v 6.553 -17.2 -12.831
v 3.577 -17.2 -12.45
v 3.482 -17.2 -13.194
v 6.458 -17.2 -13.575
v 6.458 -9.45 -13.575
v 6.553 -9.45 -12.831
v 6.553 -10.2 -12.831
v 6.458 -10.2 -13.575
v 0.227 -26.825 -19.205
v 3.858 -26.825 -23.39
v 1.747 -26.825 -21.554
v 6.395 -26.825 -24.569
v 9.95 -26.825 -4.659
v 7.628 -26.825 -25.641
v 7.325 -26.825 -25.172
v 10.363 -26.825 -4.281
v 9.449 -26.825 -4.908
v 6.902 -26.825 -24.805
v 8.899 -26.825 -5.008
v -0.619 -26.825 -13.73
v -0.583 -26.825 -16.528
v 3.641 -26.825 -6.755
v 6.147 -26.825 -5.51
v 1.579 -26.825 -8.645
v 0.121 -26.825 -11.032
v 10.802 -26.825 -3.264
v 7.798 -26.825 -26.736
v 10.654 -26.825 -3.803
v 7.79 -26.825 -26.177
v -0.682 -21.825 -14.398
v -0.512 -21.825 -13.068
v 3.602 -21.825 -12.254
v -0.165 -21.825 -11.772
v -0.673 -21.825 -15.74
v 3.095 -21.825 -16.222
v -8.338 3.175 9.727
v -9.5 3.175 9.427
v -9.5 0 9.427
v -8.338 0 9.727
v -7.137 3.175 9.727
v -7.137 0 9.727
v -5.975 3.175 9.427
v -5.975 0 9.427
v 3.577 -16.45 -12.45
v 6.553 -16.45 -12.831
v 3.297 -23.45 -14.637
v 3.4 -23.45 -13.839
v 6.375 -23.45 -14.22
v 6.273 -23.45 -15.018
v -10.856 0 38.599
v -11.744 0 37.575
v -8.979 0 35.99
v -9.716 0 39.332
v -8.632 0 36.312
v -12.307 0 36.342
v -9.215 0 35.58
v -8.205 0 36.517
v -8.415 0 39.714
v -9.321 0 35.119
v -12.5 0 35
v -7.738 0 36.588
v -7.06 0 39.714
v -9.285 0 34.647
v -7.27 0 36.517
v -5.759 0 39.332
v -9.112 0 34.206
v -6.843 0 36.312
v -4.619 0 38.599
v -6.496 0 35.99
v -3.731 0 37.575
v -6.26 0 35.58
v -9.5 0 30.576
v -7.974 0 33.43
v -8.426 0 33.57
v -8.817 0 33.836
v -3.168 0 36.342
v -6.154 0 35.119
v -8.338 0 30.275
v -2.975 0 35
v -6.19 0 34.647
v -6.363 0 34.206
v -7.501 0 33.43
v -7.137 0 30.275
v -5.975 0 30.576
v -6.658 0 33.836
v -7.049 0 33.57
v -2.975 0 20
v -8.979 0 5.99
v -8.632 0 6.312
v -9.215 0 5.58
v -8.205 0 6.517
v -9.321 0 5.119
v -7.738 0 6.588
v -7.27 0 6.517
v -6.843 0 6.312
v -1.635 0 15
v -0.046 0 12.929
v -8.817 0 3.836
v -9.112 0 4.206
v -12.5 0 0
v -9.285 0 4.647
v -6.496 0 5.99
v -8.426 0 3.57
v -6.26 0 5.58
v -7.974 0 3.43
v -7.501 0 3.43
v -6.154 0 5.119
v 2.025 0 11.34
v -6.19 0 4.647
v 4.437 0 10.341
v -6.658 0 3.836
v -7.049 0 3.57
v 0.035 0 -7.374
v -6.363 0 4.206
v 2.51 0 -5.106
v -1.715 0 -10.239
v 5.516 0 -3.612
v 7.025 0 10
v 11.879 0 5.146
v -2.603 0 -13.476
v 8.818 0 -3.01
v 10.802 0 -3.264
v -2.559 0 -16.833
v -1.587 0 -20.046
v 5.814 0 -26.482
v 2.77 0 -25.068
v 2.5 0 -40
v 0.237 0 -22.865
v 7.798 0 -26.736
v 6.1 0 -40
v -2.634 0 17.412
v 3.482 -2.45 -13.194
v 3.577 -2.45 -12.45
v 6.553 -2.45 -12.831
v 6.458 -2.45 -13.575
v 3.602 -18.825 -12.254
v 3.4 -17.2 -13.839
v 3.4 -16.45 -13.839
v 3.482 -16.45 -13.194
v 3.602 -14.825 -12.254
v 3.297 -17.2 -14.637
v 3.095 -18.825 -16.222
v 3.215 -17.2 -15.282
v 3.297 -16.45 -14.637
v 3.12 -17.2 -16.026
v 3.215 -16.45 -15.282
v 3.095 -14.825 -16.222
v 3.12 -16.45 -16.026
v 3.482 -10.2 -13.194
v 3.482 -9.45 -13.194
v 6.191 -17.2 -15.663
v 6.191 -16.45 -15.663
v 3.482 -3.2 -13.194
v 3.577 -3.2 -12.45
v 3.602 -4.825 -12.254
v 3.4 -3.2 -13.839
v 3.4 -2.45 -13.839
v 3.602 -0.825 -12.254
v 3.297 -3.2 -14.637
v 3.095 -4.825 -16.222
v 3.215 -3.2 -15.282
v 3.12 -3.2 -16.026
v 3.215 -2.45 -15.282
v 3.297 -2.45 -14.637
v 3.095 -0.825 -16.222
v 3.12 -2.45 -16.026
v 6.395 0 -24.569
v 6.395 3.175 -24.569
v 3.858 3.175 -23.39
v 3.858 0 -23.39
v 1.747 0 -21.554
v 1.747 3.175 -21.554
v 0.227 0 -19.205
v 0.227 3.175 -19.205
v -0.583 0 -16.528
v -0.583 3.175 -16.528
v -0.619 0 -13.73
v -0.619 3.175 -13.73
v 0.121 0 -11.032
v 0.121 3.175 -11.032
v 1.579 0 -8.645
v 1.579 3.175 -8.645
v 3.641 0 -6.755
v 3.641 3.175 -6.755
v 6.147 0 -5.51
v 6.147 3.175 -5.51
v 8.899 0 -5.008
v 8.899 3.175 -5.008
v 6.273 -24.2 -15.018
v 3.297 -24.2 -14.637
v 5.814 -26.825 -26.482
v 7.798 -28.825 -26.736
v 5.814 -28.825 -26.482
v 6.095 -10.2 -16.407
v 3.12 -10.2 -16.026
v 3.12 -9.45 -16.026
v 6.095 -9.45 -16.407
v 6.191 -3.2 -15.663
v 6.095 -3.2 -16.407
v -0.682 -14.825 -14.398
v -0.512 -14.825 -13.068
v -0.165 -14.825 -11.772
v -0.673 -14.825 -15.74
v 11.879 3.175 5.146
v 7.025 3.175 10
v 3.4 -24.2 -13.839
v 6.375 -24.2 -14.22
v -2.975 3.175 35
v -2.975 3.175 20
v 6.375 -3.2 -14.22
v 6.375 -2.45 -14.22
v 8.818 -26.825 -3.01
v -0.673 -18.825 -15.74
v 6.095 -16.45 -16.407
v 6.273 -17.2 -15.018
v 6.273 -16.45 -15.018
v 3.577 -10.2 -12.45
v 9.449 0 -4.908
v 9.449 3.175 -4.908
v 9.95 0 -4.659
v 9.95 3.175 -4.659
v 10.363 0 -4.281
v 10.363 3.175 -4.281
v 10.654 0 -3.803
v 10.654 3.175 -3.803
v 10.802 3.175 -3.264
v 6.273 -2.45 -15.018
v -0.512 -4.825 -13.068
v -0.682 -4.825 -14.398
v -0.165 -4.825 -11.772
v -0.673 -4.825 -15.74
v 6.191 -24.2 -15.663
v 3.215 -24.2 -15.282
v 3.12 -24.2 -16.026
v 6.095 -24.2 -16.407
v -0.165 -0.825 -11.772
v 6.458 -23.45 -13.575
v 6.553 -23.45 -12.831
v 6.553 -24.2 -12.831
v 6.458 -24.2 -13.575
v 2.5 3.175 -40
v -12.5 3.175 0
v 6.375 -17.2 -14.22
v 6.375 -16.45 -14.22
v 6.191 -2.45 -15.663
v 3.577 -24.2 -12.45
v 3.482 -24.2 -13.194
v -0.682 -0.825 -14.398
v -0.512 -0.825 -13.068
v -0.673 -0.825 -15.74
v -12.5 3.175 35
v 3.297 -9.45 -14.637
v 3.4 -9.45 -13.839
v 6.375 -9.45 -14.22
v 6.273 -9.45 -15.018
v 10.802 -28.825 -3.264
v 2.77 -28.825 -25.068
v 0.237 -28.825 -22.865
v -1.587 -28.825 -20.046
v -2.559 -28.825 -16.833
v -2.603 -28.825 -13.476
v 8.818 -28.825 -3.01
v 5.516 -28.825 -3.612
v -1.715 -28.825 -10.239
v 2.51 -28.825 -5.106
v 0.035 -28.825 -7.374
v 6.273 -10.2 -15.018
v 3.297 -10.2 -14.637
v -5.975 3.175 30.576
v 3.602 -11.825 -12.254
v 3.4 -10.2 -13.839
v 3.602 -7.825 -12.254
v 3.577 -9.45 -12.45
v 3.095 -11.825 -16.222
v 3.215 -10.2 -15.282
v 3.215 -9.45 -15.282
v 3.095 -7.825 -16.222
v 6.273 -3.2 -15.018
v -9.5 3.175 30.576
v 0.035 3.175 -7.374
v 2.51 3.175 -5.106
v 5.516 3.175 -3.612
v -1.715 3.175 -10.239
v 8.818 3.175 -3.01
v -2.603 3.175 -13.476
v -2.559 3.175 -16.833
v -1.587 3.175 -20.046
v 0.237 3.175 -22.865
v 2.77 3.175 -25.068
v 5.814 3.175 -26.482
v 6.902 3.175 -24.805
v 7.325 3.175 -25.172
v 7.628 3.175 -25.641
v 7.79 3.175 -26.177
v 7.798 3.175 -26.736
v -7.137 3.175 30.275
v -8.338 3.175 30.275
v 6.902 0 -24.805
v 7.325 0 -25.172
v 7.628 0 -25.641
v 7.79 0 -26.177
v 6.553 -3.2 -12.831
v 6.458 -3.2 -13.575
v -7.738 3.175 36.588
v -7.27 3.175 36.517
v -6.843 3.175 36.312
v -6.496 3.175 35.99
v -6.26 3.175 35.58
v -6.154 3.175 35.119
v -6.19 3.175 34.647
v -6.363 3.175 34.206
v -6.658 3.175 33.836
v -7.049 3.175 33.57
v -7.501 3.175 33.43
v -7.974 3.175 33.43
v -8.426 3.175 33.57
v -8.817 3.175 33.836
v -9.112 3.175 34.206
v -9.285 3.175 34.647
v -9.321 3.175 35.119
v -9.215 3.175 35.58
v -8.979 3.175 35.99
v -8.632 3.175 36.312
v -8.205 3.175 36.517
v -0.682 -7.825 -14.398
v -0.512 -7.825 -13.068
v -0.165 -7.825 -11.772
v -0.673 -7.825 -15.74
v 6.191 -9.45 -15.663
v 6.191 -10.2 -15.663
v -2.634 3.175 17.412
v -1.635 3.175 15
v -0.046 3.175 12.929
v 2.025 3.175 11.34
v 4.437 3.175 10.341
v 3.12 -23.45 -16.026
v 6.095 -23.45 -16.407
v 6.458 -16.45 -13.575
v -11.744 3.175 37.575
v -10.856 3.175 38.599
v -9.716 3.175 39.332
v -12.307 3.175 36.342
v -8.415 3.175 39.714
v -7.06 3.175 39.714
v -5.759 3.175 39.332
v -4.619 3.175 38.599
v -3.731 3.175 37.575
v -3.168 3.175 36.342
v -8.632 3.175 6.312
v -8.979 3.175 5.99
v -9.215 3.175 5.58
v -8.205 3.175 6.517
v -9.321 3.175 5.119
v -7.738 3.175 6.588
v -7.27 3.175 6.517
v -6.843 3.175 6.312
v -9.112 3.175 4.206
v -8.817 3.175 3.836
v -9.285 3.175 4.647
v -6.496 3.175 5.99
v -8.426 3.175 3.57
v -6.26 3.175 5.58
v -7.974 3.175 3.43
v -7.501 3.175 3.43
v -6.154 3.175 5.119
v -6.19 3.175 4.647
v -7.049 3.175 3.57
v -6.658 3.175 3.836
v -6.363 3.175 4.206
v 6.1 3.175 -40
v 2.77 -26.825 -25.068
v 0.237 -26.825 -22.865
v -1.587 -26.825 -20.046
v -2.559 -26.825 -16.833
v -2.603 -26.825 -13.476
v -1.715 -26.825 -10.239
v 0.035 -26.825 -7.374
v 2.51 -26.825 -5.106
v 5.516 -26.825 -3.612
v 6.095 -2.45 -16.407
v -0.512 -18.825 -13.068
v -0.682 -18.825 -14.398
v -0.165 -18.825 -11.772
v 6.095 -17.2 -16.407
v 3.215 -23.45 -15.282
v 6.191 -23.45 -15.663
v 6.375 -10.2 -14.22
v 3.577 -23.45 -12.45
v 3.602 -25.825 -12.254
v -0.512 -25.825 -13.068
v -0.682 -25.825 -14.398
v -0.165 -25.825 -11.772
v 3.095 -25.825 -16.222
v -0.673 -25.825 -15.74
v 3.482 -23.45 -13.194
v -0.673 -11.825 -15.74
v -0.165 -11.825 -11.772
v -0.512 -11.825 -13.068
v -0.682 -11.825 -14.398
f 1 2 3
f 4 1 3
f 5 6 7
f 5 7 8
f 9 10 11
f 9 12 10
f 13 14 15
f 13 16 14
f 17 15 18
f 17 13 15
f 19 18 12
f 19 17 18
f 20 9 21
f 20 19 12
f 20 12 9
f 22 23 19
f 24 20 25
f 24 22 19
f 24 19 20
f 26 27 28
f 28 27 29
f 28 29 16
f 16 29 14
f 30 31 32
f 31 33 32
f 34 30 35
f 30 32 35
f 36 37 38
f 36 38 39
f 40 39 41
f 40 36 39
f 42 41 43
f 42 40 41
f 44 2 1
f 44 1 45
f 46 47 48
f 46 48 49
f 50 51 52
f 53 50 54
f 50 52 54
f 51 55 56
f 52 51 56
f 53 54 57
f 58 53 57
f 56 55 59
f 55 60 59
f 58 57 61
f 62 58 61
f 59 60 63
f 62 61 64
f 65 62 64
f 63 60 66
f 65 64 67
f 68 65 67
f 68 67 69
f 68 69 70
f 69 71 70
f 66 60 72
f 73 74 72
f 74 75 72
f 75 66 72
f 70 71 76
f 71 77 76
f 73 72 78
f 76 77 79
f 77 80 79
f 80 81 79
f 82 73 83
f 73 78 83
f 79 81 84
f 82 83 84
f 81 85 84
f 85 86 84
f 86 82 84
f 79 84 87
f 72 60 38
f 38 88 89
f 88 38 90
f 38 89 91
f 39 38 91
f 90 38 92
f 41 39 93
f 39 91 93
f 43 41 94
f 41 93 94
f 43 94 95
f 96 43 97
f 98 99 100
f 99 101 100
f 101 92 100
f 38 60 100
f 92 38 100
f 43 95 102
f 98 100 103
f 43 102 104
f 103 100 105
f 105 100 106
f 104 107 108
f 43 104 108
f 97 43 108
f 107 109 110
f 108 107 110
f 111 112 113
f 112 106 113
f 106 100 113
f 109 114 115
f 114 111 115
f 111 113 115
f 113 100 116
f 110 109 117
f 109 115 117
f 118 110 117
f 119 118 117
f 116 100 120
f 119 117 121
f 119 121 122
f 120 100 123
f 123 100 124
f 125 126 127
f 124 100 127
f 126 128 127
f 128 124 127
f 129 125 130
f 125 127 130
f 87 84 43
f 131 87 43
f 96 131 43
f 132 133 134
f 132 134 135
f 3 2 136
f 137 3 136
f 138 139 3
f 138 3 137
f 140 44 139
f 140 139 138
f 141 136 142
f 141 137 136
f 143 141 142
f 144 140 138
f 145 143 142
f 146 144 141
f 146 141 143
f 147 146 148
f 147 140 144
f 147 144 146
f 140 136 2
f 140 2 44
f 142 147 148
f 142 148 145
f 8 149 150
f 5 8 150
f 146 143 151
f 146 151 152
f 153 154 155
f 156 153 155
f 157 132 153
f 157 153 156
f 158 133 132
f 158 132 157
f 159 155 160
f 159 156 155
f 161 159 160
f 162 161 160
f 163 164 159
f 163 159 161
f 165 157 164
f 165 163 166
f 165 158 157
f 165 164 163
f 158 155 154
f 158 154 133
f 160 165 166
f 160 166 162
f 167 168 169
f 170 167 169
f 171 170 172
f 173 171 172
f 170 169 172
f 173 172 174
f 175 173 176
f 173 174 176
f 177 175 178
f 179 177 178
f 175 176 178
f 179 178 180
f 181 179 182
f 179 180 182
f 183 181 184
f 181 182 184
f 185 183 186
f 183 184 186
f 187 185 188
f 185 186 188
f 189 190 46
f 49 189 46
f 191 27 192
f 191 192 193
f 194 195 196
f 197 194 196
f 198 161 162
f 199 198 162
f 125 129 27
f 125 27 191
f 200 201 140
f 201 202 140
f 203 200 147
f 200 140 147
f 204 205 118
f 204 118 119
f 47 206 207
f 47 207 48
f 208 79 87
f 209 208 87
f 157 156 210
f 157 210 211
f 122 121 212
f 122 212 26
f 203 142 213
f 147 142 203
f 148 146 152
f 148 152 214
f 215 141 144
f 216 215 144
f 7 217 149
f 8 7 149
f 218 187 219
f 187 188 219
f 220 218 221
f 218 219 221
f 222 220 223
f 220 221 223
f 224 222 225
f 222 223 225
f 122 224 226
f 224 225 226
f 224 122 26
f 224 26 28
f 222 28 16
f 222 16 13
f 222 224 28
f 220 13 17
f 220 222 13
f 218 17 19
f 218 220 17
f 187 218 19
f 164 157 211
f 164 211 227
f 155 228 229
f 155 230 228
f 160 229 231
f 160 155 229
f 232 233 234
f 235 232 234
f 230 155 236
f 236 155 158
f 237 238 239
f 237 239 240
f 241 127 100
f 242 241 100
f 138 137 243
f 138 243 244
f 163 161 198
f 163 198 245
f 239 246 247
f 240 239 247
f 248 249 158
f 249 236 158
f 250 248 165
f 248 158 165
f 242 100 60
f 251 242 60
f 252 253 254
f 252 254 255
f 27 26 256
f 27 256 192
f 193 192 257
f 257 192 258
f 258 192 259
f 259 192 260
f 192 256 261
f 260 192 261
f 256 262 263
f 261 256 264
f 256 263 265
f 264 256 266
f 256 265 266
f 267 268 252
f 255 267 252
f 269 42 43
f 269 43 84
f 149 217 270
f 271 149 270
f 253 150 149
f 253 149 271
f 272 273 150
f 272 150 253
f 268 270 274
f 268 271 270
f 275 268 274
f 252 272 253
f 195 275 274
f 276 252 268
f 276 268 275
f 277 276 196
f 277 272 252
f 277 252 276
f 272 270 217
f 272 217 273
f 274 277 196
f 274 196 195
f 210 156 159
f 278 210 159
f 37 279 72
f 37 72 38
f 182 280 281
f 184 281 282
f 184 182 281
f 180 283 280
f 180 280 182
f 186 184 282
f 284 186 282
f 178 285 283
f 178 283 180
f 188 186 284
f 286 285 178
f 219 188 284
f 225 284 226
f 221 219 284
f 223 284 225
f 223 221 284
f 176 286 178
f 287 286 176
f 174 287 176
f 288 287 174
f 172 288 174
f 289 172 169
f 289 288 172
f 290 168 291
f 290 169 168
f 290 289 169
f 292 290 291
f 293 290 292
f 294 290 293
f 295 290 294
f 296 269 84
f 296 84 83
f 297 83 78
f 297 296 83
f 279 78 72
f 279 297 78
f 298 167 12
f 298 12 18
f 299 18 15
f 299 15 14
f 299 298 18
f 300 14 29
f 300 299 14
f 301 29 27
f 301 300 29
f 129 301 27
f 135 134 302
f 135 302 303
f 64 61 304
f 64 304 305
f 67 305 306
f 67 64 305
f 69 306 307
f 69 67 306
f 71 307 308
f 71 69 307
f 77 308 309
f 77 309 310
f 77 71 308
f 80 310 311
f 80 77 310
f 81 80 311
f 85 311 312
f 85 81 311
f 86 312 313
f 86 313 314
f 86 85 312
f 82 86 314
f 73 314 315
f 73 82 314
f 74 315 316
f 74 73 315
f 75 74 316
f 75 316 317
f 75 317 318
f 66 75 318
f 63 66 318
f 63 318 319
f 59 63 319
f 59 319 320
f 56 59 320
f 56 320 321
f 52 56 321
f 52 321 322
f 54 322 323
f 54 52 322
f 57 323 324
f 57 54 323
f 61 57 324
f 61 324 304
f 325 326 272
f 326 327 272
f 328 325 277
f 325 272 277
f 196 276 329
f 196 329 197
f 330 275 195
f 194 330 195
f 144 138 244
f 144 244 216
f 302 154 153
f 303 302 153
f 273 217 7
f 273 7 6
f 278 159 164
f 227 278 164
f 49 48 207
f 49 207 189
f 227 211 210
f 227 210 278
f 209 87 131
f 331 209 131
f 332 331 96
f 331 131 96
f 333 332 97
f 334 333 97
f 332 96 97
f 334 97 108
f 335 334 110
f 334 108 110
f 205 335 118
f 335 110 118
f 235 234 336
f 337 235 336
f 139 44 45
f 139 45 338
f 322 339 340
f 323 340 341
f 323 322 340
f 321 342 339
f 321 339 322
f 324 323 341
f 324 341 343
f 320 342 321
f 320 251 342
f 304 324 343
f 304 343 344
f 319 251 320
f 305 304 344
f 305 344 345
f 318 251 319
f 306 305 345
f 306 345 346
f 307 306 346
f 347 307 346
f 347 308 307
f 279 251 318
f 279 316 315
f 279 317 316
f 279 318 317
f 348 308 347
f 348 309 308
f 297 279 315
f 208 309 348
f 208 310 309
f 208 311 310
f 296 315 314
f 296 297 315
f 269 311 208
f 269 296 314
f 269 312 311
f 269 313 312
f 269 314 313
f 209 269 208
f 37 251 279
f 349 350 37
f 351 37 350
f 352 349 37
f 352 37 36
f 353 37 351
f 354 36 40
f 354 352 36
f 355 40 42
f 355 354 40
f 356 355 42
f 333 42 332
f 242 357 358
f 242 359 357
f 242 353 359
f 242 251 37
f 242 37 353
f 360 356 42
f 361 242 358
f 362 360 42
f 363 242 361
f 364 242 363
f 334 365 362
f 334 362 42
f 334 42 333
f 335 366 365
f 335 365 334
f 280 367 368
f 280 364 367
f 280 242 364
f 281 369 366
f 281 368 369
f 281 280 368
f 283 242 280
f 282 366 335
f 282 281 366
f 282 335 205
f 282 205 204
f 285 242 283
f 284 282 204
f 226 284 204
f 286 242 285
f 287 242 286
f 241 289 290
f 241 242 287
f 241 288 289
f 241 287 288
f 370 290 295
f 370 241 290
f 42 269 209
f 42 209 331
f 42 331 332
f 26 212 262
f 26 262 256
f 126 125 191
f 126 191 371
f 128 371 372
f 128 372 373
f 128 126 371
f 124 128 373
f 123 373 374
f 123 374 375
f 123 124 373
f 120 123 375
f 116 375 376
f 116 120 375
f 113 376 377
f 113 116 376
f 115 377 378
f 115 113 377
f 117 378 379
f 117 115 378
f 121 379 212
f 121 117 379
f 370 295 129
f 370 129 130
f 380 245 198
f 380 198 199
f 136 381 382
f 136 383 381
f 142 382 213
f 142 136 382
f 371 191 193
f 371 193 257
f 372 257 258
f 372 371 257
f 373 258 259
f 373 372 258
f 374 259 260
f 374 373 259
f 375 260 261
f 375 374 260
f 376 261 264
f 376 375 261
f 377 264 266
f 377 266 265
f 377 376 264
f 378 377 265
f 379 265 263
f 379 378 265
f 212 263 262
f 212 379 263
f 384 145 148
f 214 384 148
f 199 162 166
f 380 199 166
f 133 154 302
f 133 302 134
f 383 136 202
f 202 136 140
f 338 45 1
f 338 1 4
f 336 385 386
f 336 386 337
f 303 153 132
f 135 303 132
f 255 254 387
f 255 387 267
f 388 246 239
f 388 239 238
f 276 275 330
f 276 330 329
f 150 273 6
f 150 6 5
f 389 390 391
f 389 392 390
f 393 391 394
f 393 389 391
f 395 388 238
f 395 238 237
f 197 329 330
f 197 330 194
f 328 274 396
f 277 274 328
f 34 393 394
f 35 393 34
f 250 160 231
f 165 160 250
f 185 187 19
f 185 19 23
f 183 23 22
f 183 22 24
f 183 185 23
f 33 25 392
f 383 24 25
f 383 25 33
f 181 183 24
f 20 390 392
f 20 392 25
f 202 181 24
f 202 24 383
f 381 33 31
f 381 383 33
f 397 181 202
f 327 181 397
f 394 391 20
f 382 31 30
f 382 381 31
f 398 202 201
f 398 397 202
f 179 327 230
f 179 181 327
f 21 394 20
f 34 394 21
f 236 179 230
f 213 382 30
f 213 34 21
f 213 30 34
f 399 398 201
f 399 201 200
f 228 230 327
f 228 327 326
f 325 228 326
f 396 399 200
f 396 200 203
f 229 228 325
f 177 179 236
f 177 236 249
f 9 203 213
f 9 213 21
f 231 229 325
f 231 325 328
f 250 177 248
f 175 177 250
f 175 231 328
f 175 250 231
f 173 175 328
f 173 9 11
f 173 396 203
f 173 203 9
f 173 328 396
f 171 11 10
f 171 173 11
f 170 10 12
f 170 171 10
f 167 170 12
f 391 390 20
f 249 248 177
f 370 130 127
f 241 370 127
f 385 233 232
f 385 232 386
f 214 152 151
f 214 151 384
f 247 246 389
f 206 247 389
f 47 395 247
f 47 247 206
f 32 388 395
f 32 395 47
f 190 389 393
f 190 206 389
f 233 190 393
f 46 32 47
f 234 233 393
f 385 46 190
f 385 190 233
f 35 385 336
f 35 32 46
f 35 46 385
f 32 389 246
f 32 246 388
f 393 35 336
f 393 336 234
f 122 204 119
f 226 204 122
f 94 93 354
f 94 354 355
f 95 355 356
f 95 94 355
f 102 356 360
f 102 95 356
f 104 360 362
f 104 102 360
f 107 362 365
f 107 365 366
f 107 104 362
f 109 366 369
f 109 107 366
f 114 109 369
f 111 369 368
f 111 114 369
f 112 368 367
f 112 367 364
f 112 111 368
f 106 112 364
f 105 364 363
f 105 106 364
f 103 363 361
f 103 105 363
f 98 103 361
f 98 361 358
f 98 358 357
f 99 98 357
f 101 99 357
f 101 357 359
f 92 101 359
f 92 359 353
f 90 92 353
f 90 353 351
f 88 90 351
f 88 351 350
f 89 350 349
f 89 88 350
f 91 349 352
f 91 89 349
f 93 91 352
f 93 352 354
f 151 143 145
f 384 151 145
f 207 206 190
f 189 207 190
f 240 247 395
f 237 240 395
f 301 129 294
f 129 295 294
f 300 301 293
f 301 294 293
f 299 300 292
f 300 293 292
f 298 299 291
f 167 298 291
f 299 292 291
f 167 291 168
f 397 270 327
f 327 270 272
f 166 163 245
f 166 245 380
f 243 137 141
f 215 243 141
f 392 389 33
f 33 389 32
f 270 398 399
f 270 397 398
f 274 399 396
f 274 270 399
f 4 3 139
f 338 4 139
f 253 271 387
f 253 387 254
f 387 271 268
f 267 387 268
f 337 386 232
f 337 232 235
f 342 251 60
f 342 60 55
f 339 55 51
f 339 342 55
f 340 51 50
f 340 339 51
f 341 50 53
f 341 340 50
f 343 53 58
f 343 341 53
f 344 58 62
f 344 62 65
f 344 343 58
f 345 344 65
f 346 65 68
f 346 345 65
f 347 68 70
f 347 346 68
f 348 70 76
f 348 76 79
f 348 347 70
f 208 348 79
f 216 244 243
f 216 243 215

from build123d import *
from build123d.topology import SkipClean

# Parameters (mm, degrees)
CROQUIS1_R               = 1.5875
SALIENTE_EXTRUIR1_DEPTH  = 3.175
CORTAR_EXTRUIR1_DEPTH    = 3.175
CORTAR_EXTRUIR3_DEPTH    = 10
CROQUIS5_R               = 10
CORTAR_EXTRUIR8_DEPTH    = 10
REDONDEO2_R              = 2
BOSS_EXTRUDE1_DEPTH      = 30
BOSS_EXTRUDE2_DEPTH      = 2
BOSS_EXTRUDE6_REACH      = 54.664
BOSS_EXTRUDE6_END_RADIUS = 10
SKETCH7_W                = 4
SKETCH7_H                = 4
SKETCH9_W                = 0.75
SKETCH9_H                = 0.75
SKETCH9_W_2              = 0.804911676
BOSS_EXTRUDE7_DEPTH      = 3
LPATTERN1_COUNT          = 4
LPATTERN1_PITCH          = 7


with BuildPart() as part:
    # Croquis1 → Saliente-Extruir1 (new body)
    with BuildSketch(Plane(origin=(0, 0, 0), x_dir=(1, 0, 0), z_dir=(0, 1, 0))):
        with BuildLine():
            Line((-12.5, 0), (-12.5, -40))
            Line((-12.5, -40), (-2.975, -40))
            Line((-2.975, -40), (-2.975, -20))
            ThreePointArc((-2.975, -20), (-0.046067812, -12.928932188), (7.025, -10))
            Line((7.025, -10), (12.5, -10))
            Line((12.5, -10), (12.5, 40))
            Line((12.5, 40), (2.5, 40))
            Line((2.5, 40), (-12.5, 0))
        make_face()
        with Locations(Location((-7.7375, -5, 0), (0, 0, 270))):
            Circle(CROQUIS1_R, mode=Mode.SUBTRACT)
        with Locations(Location((-7.7375, -35, 0), (0, 0, 270))):
            Circle(CROQUIS1_R, mode=Mode.SUBTRACT)
    extrude(amount=SALIENTE_EXTRUIR1_DEPTH)

    # Croquis2 → Cortar-Extruir1 (cut)
    with BuildSketch(Plane(origin=(0, 3.175, 0), x_dir=(1, 0, 0), z_dir=(0, 1, 0))):
        Polygon((12.5, -10), (6.1, 40), (12.5, 40), align=None)
    extrude(amount=-CORTAR_EXTRUIR1_DEPTH, mode=Mode.SUBTRACT)

    # Croquis3 → Cortar-Extruir3 (cut)
    with BuildSketch(Plane(origin=(0, 3.175, 0), x_dir=(1, 0, 0), z_dir=(0, 1, 0))):
        with BuildLine():
            ThreePointArc((-5.975, -30.575635639), (-7.7375, -30.2375), (-9.5, -30.575635639))
            Line((-9.5, -30.575635639), (-9.5, -9.427055314))
            ThreePointArc((-9.5, -9.427055314), (-7.7375, -9.765), (-5.975, -9.427055314))
            Line((-5.975, -9.427055314), (-5.975, -14.803847577))
            Line((-5.975, -14.803847577), (-5.975, -30.575635639))
        make_face()
        with BuildLine():
            ThreePointArc((-12.5, -35), (-7.7375, -39.7625), (-2.975, -35))
            Line((-2.975, -35), (-2.975, -40))
            Line((-2.975, -40), (-12.5, -40))
            Line((-12.5, -40), (-12.5, -35))
        make_face()
    extrude(amount=-CORTAR_EXTRUIR3_DEPTH, mode=Mode.SUBTRACT)

    # Croquis5 → Cortar-Extruir8 (cut)
    with BuildSketch(Plane(origin=(0, 3.175, 0), x_dir=(1, 0, 0), z_dir=(0, 1, 0))):
        with Locations((9.3, 15)):
            Circle(CROQUIS5_R)
        Polygon((7.025, -10), (11.878723404, -5.146276596), (12.5, -10), align=None)
    extrude(amount=-CORTAR_EXTRUIR8_DEPTH, mode=Mode.SUBTRACT)

    # Redondeo2
    redondeo2_edges = [part.edges().sort_by_distance(p)[0] for p in [
        (8.030358645, 1.5875, -24.919073083),
        (10.569641355, 1.5875, -5.080926917),
    ]]
    fillet(redondeo2_edges, radius=REDONDEO2_R)

    # Sketch1 → Boss-Extrude1 (add)
    with SkipClean():  # the faces are left unmerged after this step: merging them gives an invalid solid
        with BuildSketch(Plane(origin=(0, 3.175, 0), x_dir=(1, 0, 0), z_dir=(0, 1, 0))):
            with BuildLine():
                Line((7.79774009, 26.736405547), (5.813925473, 26.482477276))
                ThreePointArc((5.813925473, 26.482477276), (-2.6028877, 13.476430374), (8.818445293, 3.009666182))
                Line((8.818445293, 3.009666182), (10.80225991, 3.263594453))
                ThreePointArc((10.80225991, 3.263594453), (10.16969874, 4.484153931), (8.898704411, 5.008055152))
                ThreePointArc((8.898704411, 5.008055152), (-0.619073083, 13.730358645), (6.394937894, 24.568731063))
                ThreePointArc((6.394937894, 24.568731063), (7.492998908, 25.395871368), (7.79774009, 26.736405547))
            make_face()
        extrude(amount=-BOSS_EXTRUDE1_DEPTH)

    # Sketch2 → Boss-Extrude2 (add)
    with SkipClean():  # the faces are left unmerged after this step: merging them gives an invalid solid
        with BuildSketch(Plane.XZ.offset(26.825)):
            with BuildLine():
                Line((10.80225991, -3.263594453), (7.79774009, -26.736405547))
                Line((7.79774009, -26.736405547), (5.813925473, -26.482477276))
                ThreePointArc((5.813925473, -26.482477276), (-2.6028877, -13.476430374), (8.818445293, -3.009666182))
                Line((8.818445293, -3.009666182), (10.80225991, -3.263594453))
            make_face()
        extrude(amount=BOSS_EXTRUDE2_DEPTH)

    # Boss-Extrude6: up to this cylinder (the profile starts inside it)
    with SkipClean():  # the faces are left unmerged after this step: merging them gives an invalid solid
        boss_extrude6_end = Plane(origin=(9.3, -23.825, -15), z_dir=(0, 1, 0)) * Cylinder(BOSS_EXTRUDE6_END_RADIUS, 130.328, mode=Mode.PRIVATE)
        # Sketch7 → Boss-Extrude6 (add, up to the surface)
        with BuildSketch(Plane(origin=(5.087690965, 0, -0.651224444), x_dir=(-0.12696413546540503, 0, -0.9919073083234755), z_dir=(0.9919073083234755, 0, -0.12696413546540503)), mode=Mode.PRIVATE) as boss_extrude6_sk1:
            with Locations((13.697843165, -23.825)):
                Rectangle(SKETCH7_W, SKETCH7_H)
        boss_extrude6_tool1 = extrude(boss_extrude6_sk1.sketch, amount=-BOSS_EXTRUDE6_REACH, mode=Mode.PRIVATE) & boss_extrude6_end
        boss_extrude6 = boss_extrude6_tool1.solids().sort_by_distance((3.348556, -23.825, -14.238215))[0]
        add(boss_extrude6)

    # Sketch9 → Boss-Extrude7 (add)
    with SkipClean():  # the faces are left unmerged after this step: merging them gives an invalid solid
        with BuildSketch(Plane(origin=(5.087690965, 0, -0.651224444), x_dir=(-0.12696413546540508, 0, -0.9919073083234755), z_dir=(0.9919073083234755, 0, -0.12696413546540508))):
            with Locations((15.125299003, -23.825)):
                Rectangle(SKETCH9_W, SKETCH9_H)
            with Locations((13.697843165, -23.825)):
                Rectangle(SKETCH9_W_2, SKETCH9_H)
            with Locations((12.270387327, -23.825)):
                Rectangle(SKETCH9_W, SKETCH9_H)
        boss_extrude7 = extrude(amount=BOSS_EXTRUDE7_DEPTH)

    # LPattern1: Boss-Extrude6, Boss-Extrude7 ×4
    with SkipClean():  # the faces are left unmerged after this step: merging them gives an invalid solid
        with Locations(*[(0, i * LPATTERN1_PITCH, 0) for i in range(1, LPATTERN1_COUNT)]):
            add(boss_extrude6)
            add(boss_extrude7)


solid = part.part
